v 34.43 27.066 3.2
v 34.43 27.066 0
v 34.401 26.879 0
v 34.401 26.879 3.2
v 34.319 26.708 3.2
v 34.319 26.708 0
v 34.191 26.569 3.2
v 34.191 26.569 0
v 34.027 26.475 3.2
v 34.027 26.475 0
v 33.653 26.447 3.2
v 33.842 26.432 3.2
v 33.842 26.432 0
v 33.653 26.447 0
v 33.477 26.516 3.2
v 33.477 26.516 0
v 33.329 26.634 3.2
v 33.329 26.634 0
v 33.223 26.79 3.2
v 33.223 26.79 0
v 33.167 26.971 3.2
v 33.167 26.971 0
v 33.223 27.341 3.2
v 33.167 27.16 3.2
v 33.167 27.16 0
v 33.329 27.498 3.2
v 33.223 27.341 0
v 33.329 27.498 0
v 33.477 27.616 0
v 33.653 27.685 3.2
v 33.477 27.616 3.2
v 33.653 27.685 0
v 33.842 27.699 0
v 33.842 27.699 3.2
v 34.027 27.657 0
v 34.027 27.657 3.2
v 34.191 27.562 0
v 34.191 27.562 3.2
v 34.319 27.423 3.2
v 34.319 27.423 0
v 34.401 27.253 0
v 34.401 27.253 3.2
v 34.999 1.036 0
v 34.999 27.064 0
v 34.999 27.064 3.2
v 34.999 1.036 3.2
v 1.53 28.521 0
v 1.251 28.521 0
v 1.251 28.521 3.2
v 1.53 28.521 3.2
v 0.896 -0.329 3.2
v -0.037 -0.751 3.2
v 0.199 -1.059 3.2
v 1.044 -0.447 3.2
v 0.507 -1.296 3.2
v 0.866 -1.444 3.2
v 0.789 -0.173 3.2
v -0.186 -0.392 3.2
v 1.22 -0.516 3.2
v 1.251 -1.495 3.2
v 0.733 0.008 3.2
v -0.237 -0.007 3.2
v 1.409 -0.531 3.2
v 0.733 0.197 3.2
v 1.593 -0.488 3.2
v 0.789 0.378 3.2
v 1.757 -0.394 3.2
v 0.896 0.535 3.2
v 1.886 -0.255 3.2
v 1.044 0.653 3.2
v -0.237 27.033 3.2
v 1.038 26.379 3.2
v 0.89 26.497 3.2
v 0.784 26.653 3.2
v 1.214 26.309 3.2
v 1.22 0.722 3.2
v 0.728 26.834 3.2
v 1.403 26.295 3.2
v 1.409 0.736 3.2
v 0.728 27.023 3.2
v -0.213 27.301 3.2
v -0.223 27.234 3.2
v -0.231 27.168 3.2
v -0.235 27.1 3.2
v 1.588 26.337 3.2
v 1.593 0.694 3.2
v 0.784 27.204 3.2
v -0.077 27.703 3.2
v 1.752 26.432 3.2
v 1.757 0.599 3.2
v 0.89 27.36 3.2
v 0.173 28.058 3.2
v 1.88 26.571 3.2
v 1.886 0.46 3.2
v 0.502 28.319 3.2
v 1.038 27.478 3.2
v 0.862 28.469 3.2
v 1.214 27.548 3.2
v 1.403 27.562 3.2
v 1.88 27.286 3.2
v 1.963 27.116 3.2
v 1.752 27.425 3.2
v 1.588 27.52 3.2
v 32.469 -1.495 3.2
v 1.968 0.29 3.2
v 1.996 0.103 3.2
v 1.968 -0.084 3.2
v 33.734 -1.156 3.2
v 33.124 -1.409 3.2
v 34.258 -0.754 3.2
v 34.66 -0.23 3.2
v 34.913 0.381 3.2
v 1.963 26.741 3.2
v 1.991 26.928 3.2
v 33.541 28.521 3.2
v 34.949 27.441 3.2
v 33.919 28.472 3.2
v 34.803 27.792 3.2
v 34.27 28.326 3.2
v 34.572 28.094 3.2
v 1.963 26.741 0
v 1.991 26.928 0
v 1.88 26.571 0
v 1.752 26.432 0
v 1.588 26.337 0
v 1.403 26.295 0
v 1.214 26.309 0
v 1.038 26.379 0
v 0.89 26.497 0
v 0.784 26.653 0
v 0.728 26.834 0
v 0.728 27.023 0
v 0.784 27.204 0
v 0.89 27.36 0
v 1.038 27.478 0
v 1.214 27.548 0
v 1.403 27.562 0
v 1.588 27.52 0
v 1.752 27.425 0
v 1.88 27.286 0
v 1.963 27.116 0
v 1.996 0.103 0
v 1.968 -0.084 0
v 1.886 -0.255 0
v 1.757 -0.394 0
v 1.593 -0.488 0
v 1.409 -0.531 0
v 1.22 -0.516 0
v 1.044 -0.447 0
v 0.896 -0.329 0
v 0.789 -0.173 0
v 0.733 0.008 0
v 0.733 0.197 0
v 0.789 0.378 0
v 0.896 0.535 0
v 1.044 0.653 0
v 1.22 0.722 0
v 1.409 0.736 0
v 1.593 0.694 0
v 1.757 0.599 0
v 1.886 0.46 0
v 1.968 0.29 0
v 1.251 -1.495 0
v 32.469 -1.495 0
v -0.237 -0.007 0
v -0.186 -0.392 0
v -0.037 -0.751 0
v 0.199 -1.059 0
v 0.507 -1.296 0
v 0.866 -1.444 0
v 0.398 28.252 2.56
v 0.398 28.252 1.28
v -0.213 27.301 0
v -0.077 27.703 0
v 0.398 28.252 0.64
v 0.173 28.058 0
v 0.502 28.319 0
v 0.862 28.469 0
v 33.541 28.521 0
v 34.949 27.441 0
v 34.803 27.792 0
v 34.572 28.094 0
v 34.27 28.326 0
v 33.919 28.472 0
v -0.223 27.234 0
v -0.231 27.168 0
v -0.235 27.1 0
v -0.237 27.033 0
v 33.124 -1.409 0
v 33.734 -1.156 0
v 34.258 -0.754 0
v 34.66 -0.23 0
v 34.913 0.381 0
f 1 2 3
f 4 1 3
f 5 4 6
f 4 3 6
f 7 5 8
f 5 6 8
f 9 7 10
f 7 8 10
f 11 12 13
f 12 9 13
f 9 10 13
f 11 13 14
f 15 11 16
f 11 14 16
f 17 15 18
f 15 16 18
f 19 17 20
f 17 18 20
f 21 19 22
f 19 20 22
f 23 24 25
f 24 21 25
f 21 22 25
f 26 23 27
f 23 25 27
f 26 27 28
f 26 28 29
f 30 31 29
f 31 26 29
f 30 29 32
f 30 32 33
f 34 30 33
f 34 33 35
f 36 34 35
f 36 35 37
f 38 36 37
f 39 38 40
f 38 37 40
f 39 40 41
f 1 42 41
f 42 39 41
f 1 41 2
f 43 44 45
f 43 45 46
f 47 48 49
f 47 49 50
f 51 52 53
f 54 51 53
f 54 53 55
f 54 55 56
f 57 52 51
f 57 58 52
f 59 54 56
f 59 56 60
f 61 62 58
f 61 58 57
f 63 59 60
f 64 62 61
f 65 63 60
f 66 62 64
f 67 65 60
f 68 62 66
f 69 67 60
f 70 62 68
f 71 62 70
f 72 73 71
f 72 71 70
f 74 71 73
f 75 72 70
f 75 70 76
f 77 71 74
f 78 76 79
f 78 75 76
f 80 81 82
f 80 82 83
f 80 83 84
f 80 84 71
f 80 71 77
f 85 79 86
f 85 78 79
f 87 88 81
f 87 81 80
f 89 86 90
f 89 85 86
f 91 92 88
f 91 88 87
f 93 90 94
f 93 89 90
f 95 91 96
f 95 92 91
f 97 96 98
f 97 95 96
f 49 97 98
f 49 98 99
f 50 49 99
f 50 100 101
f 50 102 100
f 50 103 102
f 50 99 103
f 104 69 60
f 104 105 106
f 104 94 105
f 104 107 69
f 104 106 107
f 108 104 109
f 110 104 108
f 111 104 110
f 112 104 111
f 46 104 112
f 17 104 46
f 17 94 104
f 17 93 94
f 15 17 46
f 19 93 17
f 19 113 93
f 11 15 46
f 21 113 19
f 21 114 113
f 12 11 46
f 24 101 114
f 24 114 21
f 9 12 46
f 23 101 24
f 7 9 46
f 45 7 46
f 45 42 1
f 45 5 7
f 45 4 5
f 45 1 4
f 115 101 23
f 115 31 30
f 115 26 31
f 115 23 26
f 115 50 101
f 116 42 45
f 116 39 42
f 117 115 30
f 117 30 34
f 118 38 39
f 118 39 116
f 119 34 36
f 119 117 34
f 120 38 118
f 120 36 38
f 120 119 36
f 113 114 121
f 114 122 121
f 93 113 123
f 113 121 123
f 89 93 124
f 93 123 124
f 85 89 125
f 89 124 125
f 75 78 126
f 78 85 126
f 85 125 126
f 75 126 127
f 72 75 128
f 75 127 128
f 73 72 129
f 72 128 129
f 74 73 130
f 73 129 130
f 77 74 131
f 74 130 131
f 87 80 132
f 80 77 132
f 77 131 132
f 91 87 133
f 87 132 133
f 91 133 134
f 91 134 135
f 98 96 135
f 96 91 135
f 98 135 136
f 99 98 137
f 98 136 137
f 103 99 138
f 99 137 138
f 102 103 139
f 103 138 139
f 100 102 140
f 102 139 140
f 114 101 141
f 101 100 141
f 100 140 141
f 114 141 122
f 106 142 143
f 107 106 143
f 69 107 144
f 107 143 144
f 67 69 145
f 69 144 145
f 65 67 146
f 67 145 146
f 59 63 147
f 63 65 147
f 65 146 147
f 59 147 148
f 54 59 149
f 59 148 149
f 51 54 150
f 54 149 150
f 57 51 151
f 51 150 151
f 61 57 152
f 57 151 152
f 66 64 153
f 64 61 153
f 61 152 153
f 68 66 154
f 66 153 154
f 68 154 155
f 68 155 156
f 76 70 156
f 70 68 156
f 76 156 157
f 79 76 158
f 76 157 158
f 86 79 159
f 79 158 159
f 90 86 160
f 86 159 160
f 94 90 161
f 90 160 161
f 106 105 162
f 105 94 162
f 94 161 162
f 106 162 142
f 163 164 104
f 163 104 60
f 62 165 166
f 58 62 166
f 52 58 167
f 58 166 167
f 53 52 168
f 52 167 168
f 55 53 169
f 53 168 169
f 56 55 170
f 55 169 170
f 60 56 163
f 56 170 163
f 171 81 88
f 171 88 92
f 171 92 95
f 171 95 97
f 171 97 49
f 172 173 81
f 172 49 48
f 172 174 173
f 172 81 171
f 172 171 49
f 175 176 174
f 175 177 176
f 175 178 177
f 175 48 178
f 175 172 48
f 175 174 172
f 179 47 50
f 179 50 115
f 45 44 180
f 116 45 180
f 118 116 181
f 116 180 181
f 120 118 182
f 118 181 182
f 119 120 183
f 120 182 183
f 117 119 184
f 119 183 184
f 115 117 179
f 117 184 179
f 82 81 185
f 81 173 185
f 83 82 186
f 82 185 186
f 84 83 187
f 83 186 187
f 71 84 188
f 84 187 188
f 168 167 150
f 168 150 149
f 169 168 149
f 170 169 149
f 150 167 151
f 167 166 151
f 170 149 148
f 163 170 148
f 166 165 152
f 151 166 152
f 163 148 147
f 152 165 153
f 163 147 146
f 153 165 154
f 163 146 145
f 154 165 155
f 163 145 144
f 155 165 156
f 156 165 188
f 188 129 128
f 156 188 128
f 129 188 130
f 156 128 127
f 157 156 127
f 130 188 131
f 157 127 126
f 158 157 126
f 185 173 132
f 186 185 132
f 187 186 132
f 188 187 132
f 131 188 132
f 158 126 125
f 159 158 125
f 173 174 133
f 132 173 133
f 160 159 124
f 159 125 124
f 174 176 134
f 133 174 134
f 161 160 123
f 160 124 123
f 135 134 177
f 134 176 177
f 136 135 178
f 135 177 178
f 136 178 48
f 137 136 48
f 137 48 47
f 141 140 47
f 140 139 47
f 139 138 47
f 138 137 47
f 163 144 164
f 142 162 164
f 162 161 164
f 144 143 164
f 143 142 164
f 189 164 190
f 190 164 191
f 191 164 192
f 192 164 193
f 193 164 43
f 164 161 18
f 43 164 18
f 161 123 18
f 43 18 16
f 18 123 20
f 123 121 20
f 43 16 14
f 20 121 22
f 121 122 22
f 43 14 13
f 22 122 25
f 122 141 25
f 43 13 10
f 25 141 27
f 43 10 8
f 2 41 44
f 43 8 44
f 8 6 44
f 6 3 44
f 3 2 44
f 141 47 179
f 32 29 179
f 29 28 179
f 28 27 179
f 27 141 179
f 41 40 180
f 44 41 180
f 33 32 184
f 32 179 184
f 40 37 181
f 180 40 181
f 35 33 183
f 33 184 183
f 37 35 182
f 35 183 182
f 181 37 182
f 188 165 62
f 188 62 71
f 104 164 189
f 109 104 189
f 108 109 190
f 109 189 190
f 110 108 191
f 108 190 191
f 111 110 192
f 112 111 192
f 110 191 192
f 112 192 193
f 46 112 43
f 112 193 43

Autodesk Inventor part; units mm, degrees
ref_plane "YZ Plane" through (0, 0, 0) normal (1, 0, 0) x (0, 1, 0)
ref_plane "XZ Plane" through (0, 0, 0) normal (0, 1, 0) x (-1, 0, 0)
ref_plane "XY Plane" through (0, 0, 0) normal (0, 0, 1) x (1, 0, 0)
sketch "Base" plane through (0, 0, 0) normal (0, 0, 1) x (1, 0, 0)
  circle A0 centre (1.3558, 26.9285) radius 0.635
  line L0 (1.5304, 28.5212) -> (33.5414, 28.5212)
  spline S0 degree 3 poles (-0.2127, 27.3007) (-0.2118, 27.3054) (-0.211, 27.3101) (-0.1754, 27.4946) (-0.1031, 27.6795) (0.1087, 28.0058) (0.2483, 28.1472) (0.5483, 28.3572) (0.7287, 28.4399) (1.0276, 28.5086) (1.1402, 28.5212) (1.2508, 28.5212) knots 0.443162 0.443162 0.443162 0.443162 0.444594 0.444594 0.49954 0.49954 0.554486 0.554486 0.609433 0.609433 0.641273 0.641273 0.641273 0.641273
  ellipse E0 centre (1.2507, 27.0333) end of major axis (1.2953, 25.5461) minor radius 1.4876 (-0.2127, 27.3007) -> (-0.2369, 27.0333) ccw
  line L1 (-0.2366, -0.0071) -> (-0.2369, 27.0333)
  ellipse E1 centre (33.5414, 27.0636) end of major axis (33.5851, 25.6066) minor radius 1.4573 (34.9987, 27.0636) -> (33.5414, 28.5212) ccw
  line L2 (34.9987, 27.0636) -> (34.999, 1.0356)
  circle A1 centre (33.7947, 27.0657) radius 0.635
  ellipse E2 centre (32.4689, 1.0356) end of major axis (32.5448, -1.4939) minor radius 2.5301 (32.469, -1.495) -> (34.999, 1.0356) ccw
  line L3 (32.469, -1.495) -> (1.251, -1.495)
  ellipse E3 centre (1.251, -0.0071) end of major axis (1.2956, -1.4943) minor radius 1.4876 (-0.2366, -0.0071) -> (1.251, -1.495) ccw
  circle A2 centre (1.3611, 0.1027) radius 0.635
  line L4 (1.2508, 28.5212) -> (1.5304, 28.5212)
  point P0 (0, 0)
extrude "BaseFeature" add sketch "Base" along normal blind 3.2004
properties part number "switchback-logo-cover"
